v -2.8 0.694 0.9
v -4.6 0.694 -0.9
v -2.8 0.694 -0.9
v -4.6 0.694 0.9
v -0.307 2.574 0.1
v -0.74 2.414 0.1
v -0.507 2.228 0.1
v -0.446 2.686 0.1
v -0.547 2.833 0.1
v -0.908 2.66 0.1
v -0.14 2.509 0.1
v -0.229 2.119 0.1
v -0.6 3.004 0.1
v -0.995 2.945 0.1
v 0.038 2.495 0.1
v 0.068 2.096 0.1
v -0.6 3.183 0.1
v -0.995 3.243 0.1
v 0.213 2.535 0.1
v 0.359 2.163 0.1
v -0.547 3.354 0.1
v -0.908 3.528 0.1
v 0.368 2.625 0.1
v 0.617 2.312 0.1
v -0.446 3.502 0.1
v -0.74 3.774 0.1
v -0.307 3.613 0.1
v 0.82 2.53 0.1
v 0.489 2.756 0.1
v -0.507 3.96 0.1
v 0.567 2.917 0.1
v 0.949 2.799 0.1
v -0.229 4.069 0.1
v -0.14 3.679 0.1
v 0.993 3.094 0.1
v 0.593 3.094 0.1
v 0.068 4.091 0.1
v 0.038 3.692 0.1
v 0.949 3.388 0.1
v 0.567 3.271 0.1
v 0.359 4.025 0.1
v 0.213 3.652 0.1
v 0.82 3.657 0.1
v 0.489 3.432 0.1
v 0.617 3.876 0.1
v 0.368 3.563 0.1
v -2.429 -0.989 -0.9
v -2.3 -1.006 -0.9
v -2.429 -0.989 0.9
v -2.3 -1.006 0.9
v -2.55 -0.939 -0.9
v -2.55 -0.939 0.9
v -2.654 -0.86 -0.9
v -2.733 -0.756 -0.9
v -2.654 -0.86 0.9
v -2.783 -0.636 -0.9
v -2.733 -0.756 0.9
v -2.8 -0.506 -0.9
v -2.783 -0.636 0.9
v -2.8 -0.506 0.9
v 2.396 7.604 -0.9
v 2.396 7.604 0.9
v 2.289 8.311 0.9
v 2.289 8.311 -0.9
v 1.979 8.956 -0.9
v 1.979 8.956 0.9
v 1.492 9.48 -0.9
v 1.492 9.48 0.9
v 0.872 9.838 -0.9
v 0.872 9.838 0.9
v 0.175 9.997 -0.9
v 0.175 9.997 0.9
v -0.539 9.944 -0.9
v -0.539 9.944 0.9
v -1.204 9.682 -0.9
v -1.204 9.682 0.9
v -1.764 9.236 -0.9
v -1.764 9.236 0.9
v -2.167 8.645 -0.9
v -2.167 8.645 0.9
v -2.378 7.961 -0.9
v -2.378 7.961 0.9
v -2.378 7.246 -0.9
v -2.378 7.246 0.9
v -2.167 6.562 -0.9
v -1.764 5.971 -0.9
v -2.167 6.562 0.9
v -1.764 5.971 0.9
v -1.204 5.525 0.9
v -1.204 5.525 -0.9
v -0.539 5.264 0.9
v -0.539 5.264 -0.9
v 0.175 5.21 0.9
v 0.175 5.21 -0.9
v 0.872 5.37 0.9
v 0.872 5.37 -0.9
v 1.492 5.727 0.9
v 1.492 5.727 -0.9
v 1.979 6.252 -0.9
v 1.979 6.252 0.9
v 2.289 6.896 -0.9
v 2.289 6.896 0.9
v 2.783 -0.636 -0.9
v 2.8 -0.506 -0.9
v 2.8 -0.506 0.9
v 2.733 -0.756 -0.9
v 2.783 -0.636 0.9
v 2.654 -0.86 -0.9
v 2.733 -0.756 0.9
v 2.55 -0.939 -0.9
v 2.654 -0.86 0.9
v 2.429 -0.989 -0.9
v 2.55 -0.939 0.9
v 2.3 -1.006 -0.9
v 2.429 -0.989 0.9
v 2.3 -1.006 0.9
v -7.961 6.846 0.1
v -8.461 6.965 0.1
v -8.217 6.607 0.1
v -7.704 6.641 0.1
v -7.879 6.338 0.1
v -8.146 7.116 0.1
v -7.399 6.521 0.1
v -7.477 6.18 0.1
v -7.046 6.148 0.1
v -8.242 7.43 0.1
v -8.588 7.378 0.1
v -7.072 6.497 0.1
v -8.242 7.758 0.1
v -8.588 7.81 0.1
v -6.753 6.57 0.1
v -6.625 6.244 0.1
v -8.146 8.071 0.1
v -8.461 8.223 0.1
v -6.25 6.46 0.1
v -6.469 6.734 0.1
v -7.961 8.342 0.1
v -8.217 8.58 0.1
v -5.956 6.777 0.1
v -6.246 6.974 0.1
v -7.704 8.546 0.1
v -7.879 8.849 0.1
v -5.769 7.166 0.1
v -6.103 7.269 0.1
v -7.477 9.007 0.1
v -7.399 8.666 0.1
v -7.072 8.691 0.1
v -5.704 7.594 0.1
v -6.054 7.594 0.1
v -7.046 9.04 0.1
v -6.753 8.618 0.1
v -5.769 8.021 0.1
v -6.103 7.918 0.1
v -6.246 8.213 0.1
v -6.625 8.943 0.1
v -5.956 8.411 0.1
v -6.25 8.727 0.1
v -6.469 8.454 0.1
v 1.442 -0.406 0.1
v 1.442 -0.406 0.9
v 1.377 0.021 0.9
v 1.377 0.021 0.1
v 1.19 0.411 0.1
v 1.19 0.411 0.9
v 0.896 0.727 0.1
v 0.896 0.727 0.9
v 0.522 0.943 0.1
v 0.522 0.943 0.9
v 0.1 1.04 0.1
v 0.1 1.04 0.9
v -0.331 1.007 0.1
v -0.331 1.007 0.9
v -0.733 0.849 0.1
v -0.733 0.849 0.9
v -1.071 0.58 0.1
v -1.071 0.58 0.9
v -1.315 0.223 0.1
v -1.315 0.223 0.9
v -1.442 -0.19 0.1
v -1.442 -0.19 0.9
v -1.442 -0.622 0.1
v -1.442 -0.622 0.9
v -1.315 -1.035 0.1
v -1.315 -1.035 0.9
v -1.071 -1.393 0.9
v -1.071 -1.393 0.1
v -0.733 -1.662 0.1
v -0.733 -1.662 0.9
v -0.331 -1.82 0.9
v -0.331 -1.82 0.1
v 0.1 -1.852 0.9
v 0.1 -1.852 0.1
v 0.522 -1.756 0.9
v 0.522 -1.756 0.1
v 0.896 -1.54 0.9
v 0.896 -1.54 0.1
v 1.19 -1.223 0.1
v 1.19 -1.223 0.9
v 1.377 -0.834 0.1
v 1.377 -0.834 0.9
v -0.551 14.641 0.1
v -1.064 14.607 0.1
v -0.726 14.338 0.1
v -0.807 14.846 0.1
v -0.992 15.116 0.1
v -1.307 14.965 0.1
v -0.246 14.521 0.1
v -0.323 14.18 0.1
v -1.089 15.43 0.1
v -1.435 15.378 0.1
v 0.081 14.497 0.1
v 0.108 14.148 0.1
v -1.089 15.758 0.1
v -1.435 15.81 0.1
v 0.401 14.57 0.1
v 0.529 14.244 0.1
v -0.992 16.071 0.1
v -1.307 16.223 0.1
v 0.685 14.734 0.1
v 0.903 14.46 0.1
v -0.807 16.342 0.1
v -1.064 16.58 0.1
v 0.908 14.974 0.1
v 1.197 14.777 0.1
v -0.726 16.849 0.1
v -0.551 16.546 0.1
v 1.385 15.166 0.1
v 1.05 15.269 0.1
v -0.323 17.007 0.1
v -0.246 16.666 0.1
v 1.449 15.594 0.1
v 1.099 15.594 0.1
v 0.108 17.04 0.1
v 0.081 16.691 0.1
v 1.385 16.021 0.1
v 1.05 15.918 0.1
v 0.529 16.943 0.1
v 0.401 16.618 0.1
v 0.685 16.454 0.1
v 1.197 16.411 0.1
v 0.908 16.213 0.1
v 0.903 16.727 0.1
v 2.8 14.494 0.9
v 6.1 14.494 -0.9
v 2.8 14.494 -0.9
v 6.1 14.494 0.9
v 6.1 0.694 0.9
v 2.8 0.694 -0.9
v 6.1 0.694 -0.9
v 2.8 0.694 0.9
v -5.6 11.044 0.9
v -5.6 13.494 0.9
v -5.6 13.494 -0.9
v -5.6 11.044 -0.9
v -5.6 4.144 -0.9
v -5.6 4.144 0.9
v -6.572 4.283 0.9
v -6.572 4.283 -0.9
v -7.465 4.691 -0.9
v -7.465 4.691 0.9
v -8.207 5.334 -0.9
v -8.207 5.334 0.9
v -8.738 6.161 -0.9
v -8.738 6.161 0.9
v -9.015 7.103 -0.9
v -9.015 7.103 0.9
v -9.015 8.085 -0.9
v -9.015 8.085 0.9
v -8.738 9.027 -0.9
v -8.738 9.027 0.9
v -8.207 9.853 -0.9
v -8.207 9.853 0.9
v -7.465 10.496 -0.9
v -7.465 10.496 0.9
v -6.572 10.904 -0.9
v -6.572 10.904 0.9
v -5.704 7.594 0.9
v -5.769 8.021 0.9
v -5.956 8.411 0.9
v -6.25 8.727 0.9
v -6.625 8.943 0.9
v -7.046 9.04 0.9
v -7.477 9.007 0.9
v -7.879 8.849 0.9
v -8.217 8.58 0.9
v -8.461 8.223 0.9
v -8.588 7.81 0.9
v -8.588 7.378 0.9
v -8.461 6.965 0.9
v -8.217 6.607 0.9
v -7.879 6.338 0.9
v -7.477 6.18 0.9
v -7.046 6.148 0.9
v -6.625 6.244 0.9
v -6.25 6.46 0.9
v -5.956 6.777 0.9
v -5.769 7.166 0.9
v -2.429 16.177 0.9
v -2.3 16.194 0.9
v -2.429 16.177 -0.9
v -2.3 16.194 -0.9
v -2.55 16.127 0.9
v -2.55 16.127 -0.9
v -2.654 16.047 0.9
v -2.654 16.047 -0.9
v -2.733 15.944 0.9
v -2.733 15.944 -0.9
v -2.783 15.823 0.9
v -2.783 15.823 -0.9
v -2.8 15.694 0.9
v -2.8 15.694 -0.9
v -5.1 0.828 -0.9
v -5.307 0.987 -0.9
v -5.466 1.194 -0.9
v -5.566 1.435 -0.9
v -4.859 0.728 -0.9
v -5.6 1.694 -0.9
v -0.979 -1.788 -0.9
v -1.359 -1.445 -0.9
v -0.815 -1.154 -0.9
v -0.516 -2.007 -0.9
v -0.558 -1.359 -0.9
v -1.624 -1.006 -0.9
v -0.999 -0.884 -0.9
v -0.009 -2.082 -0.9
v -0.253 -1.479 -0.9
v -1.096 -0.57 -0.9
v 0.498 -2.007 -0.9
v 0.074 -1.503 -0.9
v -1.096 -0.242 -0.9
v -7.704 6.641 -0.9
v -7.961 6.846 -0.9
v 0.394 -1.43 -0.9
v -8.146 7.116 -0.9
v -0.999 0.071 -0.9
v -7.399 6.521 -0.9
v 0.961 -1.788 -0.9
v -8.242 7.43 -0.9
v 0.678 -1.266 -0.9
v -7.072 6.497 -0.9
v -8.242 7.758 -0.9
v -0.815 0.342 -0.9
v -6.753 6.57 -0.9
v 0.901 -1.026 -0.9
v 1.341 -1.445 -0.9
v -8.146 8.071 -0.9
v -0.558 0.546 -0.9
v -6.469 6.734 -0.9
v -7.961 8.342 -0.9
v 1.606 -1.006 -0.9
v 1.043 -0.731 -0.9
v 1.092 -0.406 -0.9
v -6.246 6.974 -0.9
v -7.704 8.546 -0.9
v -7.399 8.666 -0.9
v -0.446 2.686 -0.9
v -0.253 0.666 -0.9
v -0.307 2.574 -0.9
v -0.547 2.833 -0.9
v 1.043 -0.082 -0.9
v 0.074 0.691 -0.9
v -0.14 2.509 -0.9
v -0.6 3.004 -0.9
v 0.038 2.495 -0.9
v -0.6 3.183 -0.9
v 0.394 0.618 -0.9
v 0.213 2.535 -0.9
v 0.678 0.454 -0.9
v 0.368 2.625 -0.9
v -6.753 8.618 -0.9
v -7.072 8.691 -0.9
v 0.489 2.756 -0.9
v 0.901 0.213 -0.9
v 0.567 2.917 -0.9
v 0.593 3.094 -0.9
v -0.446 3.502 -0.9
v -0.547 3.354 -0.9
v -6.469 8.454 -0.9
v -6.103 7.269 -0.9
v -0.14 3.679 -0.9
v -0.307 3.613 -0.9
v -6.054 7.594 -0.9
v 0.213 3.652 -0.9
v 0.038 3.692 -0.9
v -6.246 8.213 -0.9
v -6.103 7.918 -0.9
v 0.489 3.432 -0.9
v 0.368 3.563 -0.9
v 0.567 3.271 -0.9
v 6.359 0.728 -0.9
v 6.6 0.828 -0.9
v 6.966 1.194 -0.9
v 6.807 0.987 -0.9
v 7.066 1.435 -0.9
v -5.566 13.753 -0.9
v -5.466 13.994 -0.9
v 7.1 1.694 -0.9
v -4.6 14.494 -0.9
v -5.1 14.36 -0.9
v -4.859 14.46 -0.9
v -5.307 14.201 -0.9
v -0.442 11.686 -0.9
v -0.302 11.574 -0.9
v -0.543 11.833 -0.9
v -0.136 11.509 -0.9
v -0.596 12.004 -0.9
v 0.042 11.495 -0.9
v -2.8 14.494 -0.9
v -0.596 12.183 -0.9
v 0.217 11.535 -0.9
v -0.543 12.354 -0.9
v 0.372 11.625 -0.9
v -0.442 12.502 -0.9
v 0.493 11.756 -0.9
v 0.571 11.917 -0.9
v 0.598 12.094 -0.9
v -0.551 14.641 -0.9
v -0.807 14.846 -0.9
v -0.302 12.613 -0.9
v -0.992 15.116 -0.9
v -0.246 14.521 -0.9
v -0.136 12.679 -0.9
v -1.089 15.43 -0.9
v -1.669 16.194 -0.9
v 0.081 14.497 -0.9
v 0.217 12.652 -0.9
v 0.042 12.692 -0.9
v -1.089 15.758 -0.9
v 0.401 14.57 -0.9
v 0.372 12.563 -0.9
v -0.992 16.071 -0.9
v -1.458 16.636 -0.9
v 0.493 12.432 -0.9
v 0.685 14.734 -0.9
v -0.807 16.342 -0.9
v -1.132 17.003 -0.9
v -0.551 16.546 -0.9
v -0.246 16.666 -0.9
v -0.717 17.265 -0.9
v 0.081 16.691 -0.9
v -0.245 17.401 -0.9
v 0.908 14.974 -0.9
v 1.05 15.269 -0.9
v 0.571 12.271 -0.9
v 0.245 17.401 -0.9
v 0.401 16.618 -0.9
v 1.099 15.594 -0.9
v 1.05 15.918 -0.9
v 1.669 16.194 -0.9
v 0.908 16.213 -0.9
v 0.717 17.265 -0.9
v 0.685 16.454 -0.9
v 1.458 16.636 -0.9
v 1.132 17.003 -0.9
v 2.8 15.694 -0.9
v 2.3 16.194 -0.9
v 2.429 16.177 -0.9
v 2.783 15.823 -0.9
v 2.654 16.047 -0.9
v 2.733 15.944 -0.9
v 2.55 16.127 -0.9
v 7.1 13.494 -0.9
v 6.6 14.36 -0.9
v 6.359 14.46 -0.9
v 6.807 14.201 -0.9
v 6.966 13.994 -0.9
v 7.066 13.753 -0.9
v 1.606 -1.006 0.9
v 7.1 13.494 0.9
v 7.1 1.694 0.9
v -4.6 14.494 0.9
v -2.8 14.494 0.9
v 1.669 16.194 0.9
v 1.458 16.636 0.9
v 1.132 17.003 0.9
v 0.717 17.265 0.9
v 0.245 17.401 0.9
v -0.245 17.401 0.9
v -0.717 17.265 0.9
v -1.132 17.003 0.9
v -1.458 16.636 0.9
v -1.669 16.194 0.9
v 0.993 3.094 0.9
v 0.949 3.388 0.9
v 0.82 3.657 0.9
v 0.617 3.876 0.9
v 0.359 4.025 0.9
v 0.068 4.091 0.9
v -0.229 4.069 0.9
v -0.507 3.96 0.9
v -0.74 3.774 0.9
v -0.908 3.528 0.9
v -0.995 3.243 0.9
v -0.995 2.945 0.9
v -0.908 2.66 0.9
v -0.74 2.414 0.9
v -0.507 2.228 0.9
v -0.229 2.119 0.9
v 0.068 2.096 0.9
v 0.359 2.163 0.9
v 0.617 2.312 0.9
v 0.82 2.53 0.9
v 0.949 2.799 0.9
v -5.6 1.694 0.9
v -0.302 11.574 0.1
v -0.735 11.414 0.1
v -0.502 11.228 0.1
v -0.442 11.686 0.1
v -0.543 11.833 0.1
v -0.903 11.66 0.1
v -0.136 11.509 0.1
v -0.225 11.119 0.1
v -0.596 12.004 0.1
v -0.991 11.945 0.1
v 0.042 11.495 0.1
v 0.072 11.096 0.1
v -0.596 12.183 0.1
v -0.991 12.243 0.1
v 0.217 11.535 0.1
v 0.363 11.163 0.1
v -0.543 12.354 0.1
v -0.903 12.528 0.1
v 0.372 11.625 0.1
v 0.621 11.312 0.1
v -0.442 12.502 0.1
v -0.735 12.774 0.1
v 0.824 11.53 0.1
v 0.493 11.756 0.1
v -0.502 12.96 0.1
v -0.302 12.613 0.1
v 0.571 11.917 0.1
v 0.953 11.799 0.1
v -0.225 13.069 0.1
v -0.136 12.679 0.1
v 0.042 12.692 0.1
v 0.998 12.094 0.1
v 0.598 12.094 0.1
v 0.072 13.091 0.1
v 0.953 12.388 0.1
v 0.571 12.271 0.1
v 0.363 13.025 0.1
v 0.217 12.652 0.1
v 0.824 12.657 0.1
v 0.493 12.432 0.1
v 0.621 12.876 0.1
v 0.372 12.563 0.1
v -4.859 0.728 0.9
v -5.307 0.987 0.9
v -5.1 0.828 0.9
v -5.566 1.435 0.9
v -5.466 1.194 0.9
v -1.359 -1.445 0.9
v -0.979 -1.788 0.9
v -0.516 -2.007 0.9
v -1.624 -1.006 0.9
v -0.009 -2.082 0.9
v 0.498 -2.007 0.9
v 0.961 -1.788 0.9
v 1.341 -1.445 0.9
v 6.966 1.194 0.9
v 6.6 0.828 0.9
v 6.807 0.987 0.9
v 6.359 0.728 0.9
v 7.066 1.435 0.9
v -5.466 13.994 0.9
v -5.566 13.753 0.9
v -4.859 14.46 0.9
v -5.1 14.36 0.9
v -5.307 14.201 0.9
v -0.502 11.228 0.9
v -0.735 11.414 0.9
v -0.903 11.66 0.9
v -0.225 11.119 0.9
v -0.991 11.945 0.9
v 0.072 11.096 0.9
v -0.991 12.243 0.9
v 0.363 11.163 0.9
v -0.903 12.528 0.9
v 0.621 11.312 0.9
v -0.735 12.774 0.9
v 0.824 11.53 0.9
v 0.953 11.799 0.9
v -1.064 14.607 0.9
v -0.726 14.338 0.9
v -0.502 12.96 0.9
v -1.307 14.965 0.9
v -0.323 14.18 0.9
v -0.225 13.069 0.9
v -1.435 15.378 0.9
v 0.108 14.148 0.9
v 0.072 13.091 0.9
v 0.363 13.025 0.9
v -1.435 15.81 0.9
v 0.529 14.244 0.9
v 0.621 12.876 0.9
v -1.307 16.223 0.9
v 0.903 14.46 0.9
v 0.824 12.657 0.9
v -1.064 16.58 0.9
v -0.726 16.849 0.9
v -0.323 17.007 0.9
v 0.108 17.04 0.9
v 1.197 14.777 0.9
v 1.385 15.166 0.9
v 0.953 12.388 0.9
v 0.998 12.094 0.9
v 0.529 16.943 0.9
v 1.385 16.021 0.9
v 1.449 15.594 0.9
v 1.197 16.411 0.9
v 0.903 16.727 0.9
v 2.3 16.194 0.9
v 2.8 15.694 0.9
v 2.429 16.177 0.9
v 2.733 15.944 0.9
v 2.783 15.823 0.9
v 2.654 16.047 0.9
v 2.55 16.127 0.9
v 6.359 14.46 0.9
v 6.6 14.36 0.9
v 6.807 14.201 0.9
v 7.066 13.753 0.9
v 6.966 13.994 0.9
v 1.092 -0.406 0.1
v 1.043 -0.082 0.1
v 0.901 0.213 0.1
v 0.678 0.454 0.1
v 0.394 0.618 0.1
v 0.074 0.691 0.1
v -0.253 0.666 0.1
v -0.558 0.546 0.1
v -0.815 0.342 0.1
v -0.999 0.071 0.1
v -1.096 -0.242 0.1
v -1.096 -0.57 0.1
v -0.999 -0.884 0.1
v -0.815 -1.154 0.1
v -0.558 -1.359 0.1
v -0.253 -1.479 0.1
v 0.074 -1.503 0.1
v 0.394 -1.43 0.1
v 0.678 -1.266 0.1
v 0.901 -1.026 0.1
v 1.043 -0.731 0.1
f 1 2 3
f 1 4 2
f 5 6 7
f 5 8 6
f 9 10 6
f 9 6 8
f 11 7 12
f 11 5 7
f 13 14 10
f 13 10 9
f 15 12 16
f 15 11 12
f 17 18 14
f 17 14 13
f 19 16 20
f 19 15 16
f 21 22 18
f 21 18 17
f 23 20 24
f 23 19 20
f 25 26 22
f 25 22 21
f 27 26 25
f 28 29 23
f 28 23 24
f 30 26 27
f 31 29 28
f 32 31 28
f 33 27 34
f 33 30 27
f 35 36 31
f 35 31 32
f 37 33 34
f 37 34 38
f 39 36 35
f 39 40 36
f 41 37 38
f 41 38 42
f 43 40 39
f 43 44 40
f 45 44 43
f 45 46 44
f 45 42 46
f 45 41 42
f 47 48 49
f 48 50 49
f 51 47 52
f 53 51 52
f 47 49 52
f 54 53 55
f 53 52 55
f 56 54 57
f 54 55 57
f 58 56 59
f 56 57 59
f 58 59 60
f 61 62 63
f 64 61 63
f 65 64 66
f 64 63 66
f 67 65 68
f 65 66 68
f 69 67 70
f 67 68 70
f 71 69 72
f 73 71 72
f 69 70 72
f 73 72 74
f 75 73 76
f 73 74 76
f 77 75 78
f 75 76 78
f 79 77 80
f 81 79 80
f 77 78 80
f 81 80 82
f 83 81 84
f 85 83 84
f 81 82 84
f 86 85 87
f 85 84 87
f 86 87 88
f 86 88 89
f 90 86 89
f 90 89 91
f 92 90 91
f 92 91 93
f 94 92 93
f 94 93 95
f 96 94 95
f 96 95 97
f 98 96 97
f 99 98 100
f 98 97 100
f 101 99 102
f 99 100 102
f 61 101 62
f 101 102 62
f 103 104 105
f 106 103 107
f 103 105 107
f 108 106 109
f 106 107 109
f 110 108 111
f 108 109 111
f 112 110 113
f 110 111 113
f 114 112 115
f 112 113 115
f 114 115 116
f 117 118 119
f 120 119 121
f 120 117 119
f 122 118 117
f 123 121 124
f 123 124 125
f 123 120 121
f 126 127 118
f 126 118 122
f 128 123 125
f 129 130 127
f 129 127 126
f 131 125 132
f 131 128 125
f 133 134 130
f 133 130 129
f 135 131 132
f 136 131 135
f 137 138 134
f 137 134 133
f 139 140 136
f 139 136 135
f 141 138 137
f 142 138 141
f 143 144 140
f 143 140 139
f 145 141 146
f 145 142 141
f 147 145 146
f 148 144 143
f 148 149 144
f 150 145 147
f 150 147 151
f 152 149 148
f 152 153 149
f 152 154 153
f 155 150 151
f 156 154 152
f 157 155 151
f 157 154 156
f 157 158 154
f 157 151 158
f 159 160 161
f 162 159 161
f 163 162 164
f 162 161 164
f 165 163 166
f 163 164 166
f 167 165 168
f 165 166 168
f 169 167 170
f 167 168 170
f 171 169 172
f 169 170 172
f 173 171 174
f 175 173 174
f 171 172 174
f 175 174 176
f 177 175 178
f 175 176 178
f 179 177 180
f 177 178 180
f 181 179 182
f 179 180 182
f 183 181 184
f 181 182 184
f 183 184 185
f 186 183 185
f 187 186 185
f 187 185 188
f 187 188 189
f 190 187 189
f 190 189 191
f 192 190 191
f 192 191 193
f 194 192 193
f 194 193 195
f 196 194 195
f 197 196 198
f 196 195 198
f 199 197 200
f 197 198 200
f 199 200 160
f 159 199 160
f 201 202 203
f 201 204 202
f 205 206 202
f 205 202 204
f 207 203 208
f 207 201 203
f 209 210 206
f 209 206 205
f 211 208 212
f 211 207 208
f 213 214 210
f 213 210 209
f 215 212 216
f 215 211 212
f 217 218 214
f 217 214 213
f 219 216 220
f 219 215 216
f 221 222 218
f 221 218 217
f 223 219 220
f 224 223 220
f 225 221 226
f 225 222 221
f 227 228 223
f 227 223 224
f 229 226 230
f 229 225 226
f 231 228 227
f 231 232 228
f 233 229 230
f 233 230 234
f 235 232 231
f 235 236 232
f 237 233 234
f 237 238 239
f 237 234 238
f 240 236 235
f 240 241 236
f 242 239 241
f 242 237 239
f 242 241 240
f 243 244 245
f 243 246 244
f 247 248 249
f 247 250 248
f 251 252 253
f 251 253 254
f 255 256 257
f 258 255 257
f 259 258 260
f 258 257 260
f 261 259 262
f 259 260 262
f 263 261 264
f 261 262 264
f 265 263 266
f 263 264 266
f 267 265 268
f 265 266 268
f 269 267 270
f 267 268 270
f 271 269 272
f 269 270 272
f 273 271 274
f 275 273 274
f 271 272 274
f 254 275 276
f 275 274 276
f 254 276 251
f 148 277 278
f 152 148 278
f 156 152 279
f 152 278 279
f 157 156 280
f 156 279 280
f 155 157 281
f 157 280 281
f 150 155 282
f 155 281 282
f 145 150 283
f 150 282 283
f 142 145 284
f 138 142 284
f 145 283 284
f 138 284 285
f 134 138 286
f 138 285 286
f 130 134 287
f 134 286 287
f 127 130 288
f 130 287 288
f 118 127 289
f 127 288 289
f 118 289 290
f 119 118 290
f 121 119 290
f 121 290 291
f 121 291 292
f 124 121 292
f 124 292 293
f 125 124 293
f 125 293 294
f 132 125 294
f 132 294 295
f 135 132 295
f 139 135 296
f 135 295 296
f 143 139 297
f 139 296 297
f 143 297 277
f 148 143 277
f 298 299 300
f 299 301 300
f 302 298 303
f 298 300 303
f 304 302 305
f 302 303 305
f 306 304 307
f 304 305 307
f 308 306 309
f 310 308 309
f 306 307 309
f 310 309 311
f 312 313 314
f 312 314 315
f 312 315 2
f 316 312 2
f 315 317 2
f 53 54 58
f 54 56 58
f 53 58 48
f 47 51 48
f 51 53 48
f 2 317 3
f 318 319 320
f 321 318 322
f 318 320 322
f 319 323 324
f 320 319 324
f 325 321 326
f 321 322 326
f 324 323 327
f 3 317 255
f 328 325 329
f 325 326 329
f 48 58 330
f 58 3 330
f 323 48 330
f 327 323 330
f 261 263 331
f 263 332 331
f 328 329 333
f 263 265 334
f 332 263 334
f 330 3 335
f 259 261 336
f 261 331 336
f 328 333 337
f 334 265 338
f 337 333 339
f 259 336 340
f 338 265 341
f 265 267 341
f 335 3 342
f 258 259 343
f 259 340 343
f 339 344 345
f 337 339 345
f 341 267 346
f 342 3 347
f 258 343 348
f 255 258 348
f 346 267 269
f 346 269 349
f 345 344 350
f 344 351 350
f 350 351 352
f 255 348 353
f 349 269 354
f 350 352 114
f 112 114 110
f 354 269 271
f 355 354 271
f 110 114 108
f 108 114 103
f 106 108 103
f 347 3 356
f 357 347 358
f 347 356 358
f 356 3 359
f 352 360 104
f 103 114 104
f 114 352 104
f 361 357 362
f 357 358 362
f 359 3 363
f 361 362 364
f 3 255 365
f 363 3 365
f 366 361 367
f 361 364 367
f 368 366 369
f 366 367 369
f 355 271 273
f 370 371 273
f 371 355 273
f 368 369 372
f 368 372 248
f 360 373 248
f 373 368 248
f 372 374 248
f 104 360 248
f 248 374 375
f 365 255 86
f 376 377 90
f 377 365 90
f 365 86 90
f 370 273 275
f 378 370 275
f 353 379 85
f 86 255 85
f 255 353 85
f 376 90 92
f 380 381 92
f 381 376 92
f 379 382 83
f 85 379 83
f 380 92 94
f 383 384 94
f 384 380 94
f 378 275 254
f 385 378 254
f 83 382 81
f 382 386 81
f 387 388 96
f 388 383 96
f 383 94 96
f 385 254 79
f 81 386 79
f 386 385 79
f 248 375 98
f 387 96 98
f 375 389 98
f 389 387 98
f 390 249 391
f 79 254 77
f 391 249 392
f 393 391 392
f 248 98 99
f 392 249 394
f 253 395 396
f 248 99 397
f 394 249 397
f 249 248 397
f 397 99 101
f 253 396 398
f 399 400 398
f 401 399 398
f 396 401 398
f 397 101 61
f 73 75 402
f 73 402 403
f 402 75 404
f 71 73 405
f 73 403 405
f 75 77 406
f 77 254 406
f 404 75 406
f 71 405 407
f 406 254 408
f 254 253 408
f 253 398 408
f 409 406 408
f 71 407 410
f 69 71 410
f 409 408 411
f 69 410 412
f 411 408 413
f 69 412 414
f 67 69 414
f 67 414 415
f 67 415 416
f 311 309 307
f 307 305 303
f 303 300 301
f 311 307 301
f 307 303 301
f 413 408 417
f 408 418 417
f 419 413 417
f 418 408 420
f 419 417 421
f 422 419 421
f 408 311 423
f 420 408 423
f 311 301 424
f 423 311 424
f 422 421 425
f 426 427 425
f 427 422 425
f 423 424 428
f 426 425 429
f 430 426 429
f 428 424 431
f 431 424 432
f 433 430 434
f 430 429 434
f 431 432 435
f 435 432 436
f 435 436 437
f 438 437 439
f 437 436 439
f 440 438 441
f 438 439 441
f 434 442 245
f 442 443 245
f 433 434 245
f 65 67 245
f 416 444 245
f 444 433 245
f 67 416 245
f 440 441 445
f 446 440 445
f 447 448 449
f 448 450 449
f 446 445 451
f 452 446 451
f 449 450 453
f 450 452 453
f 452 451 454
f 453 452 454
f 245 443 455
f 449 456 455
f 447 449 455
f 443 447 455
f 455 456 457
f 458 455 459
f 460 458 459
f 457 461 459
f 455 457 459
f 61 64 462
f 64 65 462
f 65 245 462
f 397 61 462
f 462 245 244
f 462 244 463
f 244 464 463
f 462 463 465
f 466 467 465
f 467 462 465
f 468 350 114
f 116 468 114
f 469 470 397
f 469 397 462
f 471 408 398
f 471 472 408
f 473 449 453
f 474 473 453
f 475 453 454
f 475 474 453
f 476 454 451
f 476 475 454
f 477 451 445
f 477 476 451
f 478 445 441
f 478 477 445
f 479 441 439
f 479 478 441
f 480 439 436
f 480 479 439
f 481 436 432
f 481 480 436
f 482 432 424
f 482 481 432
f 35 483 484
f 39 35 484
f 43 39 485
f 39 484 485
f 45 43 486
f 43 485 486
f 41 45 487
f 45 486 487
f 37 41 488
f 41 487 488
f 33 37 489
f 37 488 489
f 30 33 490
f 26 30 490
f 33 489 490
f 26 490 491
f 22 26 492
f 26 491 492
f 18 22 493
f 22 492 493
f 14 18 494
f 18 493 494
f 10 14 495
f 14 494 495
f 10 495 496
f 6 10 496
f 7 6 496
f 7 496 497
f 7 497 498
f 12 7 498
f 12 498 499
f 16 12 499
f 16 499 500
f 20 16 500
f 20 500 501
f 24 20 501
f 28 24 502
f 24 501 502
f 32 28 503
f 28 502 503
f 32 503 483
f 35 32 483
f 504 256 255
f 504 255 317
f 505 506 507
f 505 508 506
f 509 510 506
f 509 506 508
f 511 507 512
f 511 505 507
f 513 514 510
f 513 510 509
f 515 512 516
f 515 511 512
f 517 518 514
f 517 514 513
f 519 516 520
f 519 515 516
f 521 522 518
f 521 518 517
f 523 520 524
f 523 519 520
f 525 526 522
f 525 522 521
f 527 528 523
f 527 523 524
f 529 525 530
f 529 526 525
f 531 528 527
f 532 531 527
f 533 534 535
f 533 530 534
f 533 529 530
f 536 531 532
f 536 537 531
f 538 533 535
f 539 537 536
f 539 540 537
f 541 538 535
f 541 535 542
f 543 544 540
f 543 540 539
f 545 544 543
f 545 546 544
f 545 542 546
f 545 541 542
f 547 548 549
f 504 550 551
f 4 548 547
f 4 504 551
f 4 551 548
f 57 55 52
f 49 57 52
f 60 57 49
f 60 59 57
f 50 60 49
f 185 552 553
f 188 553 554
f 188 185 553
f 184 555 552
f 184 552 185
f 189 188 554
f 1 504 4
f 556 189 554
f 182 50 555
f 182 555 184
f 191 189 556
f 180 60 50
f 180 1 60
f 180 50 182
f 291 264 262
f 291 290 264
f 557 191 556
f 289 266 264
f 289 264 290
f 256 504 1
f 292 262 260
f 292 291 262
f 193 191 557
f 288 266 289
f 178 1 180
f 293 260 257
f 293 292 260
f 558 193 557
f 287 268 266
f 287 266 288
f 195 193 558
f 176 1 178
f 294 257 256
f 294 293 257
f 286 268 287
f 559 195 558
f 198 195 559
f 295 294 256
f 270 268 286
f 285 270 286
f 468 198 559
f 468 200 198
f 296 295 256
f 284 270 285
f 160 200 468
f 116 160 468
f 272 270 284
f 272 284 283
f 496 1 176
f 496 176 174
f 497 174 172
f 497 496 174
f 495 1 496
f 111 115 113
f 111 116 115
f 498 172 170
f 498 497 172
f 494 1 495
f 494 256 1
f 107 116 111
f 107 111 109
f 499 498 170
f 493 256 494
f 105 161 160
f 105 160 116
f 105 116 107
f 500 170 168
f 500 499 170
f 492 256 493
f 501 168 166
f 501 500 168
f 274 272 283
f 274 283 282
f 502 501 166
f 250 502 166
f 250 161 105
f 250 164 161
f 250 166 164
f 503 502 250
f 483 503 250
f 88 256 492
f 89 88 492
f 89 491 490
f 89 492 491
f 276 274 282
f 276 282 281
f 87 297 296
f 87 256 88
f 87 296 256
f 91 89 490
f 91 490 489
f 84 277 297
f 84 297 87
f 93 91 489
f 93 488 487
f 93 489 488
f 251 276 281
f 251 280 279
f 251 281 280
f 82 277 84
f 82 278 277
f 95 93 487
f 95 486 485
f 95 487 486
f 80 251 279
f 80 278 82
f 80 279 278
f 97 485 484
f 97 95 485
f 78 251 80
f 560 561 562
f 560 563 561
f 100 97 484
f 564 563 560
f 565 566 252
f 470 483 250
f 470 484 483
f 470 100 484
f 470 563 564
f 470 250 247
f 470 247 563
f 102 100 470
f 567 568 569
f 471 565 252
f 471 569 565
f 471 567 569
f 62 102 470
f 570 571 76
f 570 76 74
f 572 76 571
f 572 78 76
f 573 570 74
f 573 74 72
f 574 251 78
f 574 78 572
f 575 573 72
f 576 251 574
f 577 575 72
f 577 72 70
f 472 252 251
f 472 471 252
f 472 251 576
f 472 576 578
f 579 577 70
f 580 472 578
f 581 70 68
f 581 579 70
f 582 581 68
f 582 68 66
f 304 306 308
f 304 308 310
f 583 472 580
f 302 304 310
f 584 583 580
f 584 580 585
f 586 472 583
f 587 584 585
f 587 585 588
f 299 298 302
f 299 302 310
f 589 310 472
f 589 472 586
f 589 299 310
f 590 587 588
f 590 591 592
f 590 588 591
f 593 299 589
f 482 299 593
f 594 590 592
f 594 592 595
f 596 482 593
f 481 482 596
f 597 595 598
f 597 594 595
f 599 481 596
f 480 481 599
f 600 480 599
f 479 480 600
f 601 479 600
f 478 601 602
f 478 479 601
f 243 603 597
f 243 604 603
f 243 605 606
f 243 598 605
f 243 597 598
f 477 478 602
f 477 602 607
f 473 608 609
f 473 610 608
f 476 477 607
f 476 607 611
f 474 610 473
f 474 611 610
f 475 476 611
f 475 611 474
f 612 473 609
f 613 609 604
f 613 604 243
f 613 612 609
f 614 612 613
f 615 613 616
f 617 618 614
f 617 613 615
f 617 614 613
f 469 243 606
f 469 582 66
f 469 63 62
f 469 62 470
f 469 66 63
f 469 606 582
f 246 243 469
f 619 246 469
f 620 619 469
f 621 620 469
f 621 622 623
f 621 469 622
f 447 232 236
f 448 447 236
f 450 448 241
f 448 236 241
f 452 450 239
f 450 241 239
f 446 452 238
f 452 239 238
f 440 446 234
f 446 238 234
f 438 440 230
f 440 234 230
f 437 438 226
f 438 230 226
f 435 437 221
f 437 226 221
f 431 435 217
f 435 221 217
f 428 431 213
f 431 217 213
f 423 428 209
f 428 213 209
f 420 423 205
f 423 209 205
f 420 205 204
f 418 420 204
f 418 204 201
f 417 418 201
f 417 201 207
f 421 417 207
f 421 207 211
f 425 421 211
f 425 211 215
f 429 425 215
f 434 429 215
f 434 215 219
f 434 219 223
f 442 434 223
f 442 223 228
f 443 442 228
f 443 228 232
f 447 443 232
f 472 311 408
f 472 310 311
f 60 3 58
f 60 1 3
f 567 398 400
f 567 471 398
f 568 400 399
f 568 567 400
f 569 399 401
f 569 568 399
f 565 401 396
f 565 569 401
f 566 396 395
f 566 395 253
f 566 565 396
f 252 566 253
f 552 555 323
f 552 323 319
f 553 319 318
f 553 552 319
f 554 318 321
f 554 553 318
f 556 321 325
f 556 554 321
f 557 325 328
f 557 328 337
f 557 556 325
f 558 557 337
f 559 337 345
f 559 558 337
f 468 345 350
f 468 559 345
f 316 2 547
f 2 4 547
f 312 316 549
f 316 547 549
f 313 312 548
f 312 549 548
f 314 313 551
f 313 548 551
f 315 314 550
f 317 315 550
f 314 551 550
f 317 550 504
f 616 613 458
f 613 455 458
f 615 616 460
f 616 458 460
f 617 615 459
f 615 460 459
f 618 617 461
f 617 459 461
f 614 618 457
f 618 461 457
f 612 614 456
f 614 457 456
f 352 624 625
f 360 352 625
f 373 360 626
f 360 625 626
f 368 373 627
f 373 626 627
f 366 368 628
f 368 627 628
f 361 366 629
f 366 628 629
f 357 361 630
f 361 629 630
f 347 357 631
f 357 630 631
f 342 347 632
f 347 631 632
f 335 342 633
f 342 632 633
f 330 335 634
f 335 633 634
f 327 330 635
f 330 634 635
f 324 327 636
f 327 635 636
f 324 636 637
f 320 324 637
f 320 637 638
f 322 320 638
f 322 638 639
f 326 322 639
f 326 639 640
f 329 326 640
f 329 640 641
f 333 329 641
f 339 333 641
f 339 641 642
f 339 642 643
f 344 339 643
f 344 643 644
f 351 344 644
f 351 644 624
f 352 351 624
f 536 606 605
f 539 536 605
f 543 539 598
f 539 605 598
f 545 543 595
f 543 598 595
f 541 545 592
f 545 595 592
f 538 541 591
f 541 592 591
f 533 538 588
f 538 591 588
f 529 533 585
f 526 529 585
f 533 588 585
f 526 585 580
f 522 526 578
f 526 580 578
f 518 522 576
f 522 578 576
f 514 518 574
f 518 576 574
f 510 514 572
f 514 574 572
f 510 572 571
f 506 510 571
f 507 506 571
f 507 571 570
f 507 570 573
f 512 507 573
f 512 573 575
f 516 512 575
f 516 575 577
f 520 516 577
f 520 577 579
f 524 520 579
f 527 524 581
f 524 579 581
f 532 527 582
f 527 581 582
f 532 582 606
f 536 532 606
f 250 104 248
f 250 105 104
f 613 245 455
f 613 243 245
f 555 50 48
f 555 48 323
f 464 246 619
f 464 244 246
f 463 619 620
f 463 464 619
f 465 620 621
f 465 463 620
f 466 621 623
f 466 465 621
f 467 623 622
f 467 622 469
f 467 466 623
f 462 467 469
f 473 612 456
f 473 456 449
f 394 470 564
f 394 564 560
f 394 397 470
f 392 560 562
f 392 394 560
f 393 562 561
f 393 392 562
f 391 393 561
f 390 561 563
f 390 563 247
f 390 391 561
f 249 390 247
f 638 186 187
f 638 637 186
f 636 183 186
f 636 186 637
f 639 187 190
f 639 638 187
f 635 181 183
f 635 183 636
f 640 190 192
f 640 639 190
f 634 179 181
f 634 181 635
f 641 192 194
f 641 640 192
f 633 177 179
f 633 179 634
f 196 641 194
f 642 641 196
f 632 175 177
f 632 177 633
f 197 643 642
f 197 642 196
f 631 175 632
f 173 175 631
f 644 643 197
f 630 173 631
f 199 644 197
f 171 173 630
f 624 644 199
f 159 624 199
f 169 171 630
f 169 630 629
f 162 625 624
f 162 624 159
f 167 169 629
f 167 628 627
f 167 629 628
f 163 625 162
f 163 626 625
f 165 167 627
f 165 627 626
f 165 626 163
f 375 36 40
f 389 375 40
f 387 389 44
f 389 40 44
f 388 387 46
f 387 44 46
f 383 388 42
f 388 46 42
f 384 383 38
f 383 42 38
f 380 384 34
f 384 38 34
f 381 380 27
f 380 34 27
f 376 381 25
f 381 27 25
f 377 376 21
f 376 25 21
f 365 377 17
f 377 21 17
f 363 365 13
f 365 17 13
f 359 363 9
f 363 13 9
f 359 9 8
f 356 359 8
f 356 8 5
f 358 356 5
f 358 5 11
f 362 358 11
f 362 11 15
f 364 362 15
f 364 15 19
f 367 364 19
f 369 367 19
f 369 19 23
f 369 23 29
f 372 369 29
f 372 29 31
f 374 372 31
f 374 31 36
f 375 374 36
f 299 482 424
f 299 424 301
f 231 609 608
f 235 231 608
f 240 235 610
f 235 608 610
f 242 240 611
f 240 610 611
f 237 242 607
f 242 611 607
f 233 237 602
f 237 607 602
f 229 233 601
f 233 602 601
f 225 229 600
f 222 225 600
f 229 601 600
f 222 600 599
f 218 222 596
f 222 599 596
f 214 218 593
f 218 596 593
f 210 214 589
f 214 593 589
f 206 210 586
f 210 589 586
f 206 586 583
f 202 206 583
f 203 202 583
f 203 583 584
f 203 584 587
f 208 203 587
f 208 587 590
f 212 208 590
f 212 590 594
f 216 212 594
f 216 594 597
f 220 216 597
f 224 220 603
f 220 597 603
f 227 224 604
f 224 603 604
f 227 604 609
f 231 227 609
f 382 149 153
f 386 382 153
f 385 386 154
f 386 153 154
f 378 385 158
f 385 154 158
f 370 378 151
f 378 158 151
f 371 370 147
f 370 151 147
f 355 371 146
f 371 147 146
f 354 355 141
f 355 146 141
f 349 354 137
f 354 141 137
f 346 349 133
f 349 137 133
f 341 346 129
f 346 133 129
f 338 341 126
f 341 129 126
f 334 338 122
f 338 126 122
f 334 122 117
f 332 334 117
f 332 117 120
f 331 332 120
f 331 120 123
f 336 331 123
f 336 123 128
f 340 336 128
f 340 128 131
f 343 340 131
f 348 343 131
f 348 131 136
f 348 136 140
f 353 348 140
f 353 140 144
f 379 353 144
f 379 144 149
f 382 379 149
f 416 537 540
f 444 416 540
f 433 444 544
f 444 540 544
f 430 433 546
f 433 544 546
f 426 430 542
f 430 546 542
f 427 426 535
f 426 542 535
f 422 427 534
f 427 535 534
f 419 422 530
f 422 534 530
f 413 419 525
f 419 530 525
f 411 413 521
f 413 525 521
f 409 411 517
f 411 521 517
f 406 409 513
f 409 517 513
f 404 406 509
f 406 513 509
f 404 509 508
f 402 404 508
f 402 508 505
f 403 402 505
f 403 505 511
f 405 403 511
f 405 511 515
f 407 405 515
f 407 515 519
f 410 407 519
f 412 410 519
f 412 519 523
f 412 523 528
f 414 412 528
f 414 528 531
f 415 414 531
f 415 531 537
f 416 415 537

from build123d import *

# Parameters (mm, degrees)
BODY_DEPTH                      = 0.9
SIDE_EXTENDER_2_R               = 1.75
SIDE_EXTENDER_DEPTH             = 1.8
CENTER_EXTERN_W                 = 3
CENTER_EXTERN_H                 = 13.8
EXTENDER_CENTER_DEPTH           = 1.8
HOLES_R                         = 1.1
HOLES_R_2                       = 0.6
SCREW_HOLES_DEPTH               = 1.8
SHAFT_HOLE_R                    = 2.4
MOTOR_SHAFT_DEPTH               = 1.8
SKIZZE6_R                       = 1
SKIZZE6_R_2                     = 1.45
SCHNITT_LINEAR_AUSTRAGEN5_DEPTH = 0.8
VERRUNDUNG1_R                   = 1
VERRUNDUNG2_R                   = 0.5


with BuildPart() as part:
    # body 2 → body (new body, symmetric)
    with BuildSketch(Plane.XY):
        Polygon((0, 16.193693694), (-2.8, 16.193693694), (-2.8, 14.493693694), (-5.6, 14.493693694), (-5.6, 0.693693694), (-2.8, 0.693693694), (-2.8, -1.006306306), (0, -1.006306306), (2.8, -1.006306306), (2.8, 0.693693694), (5.6, 0.693693694), (5.6, 14.493693694), (2.8, 14.493693694), (2.8, 16.193693694), align=None)
    extrude(amount=BODY_DEPTH, both=True)

    # side_extender 2 → side-extender (add)
    with BuildSketch(Plane.XY.offset(0.9)):
        with Locations((0, 15.667972906)):
            Circle(SIDE_EXTENDER_2_R)
        with Locations((-0.0089251, -0.332027094)):
            Circle(SIDE_EXTENDER_2_R)
    extrude(amount=-SIDE_EXTENDER_DEPTH)

    # center-extern → Extender-center (add)
    with BuildSketch(Plane.XY.offset(0.9)):
        with BuildLine():
            Line((-5.6, 11.043693694), (-5.6, 4.143693694))
            ThreePointArc((-5.6, 4.143693694), (-9.05, 7.593693694), (-5.6, 11.043693694))
        make_face()
        with Locations((5.6, 7.593693694)):
            Rectangle(CENTER_EXTERN_W, CENTER_EXTERN_H)
    extrude(amount=-EXTENDER_CENTER_DEPTH)

    # holes → screw-holes (cut)
    with BuildSketch(Plane.XY.offset(0.9)):
        with Locations((-7.154497296, 7.593693694)):
            Circle(HOLES_R)
        with Locations((-0.000834968, 15.593693694)):
            Circle(HOLES_R)
        with Locations((-0.008158127, -0.406306306)):
            Circle(HOLES_R)
        with Locations((-0.002436909, 12.093693694)):
            Circle(HOLES_R_2)
        with Locations((-0.006556186, 3.093693694)):
            Circle(HOLES_R_2)
    extrude(amount=-SCREW_HOLES_DEPTH, mode=Mode.SUBTRACT)

    # shaft hole → motor shaft (cut)
    with BuildSketch(Plane.XY.offset(0.9)):
        with Locations((-0.00446255, 7.603703107)):
            Circle(SHAFT_HOLE_R)
    extrude(amount=-MOTOR_SHAFT_DEPTH, mode=Mode.SUBTRACT)

    # Skizze6 → Schnitt-Linear austragen5 (cut)
    with BuildSketch(Plane.XY.offset(0.9)):
        with Locations((-0.002436909, 12.093693694)):
            Circle(SKIZZE6_R)
        with Locations((-0.006556186, 3.093693694)):
            Circle(SKIZZE6_R)
        with Locations((-0.000834968, 15.593693694)):
            Circle(SKIZZE6_R_2)
        with Locations((-0.008158127, -0.406306306)):
            Circle(SKIZZE6_R_2)
        with Locations((-7.154497296, 7.593693694)):
            Circle(SKIZZE6_R_2)
    extrude(amount=-SCHNITT_LINEAR_AUSTRAGEN5_DEPTH, mode=Mode.SUBTRACT)

    # Verrundung1
    verrundung1_edges = [part.edges().sort_by_distance(p)[0] for p in [
        (-5.6, 0.693693694, 0),
        (-5.6, 14.493693694, 0),
        (7.1, 0.693693694, 0),
        (7.1, 14.493693694, 0),
    ]]
    fillet(verrundung1_edges, radius=VERRUNDUNG1_R)

    # Verrundung2
    verrundung2_edges = [part.edges().sort_by_distance(p)[0] for p in [
        (2.8, 16.193693694, 0),
        (2.8, -1.006306306, 0),
        (-2.8, -1.006306306, 0),
        (-2.8, 16.193693694, 0),
    ]]
    fillet(verrundung2_edges, radius=VERRUNDUNG2_R)


solid = part.part
